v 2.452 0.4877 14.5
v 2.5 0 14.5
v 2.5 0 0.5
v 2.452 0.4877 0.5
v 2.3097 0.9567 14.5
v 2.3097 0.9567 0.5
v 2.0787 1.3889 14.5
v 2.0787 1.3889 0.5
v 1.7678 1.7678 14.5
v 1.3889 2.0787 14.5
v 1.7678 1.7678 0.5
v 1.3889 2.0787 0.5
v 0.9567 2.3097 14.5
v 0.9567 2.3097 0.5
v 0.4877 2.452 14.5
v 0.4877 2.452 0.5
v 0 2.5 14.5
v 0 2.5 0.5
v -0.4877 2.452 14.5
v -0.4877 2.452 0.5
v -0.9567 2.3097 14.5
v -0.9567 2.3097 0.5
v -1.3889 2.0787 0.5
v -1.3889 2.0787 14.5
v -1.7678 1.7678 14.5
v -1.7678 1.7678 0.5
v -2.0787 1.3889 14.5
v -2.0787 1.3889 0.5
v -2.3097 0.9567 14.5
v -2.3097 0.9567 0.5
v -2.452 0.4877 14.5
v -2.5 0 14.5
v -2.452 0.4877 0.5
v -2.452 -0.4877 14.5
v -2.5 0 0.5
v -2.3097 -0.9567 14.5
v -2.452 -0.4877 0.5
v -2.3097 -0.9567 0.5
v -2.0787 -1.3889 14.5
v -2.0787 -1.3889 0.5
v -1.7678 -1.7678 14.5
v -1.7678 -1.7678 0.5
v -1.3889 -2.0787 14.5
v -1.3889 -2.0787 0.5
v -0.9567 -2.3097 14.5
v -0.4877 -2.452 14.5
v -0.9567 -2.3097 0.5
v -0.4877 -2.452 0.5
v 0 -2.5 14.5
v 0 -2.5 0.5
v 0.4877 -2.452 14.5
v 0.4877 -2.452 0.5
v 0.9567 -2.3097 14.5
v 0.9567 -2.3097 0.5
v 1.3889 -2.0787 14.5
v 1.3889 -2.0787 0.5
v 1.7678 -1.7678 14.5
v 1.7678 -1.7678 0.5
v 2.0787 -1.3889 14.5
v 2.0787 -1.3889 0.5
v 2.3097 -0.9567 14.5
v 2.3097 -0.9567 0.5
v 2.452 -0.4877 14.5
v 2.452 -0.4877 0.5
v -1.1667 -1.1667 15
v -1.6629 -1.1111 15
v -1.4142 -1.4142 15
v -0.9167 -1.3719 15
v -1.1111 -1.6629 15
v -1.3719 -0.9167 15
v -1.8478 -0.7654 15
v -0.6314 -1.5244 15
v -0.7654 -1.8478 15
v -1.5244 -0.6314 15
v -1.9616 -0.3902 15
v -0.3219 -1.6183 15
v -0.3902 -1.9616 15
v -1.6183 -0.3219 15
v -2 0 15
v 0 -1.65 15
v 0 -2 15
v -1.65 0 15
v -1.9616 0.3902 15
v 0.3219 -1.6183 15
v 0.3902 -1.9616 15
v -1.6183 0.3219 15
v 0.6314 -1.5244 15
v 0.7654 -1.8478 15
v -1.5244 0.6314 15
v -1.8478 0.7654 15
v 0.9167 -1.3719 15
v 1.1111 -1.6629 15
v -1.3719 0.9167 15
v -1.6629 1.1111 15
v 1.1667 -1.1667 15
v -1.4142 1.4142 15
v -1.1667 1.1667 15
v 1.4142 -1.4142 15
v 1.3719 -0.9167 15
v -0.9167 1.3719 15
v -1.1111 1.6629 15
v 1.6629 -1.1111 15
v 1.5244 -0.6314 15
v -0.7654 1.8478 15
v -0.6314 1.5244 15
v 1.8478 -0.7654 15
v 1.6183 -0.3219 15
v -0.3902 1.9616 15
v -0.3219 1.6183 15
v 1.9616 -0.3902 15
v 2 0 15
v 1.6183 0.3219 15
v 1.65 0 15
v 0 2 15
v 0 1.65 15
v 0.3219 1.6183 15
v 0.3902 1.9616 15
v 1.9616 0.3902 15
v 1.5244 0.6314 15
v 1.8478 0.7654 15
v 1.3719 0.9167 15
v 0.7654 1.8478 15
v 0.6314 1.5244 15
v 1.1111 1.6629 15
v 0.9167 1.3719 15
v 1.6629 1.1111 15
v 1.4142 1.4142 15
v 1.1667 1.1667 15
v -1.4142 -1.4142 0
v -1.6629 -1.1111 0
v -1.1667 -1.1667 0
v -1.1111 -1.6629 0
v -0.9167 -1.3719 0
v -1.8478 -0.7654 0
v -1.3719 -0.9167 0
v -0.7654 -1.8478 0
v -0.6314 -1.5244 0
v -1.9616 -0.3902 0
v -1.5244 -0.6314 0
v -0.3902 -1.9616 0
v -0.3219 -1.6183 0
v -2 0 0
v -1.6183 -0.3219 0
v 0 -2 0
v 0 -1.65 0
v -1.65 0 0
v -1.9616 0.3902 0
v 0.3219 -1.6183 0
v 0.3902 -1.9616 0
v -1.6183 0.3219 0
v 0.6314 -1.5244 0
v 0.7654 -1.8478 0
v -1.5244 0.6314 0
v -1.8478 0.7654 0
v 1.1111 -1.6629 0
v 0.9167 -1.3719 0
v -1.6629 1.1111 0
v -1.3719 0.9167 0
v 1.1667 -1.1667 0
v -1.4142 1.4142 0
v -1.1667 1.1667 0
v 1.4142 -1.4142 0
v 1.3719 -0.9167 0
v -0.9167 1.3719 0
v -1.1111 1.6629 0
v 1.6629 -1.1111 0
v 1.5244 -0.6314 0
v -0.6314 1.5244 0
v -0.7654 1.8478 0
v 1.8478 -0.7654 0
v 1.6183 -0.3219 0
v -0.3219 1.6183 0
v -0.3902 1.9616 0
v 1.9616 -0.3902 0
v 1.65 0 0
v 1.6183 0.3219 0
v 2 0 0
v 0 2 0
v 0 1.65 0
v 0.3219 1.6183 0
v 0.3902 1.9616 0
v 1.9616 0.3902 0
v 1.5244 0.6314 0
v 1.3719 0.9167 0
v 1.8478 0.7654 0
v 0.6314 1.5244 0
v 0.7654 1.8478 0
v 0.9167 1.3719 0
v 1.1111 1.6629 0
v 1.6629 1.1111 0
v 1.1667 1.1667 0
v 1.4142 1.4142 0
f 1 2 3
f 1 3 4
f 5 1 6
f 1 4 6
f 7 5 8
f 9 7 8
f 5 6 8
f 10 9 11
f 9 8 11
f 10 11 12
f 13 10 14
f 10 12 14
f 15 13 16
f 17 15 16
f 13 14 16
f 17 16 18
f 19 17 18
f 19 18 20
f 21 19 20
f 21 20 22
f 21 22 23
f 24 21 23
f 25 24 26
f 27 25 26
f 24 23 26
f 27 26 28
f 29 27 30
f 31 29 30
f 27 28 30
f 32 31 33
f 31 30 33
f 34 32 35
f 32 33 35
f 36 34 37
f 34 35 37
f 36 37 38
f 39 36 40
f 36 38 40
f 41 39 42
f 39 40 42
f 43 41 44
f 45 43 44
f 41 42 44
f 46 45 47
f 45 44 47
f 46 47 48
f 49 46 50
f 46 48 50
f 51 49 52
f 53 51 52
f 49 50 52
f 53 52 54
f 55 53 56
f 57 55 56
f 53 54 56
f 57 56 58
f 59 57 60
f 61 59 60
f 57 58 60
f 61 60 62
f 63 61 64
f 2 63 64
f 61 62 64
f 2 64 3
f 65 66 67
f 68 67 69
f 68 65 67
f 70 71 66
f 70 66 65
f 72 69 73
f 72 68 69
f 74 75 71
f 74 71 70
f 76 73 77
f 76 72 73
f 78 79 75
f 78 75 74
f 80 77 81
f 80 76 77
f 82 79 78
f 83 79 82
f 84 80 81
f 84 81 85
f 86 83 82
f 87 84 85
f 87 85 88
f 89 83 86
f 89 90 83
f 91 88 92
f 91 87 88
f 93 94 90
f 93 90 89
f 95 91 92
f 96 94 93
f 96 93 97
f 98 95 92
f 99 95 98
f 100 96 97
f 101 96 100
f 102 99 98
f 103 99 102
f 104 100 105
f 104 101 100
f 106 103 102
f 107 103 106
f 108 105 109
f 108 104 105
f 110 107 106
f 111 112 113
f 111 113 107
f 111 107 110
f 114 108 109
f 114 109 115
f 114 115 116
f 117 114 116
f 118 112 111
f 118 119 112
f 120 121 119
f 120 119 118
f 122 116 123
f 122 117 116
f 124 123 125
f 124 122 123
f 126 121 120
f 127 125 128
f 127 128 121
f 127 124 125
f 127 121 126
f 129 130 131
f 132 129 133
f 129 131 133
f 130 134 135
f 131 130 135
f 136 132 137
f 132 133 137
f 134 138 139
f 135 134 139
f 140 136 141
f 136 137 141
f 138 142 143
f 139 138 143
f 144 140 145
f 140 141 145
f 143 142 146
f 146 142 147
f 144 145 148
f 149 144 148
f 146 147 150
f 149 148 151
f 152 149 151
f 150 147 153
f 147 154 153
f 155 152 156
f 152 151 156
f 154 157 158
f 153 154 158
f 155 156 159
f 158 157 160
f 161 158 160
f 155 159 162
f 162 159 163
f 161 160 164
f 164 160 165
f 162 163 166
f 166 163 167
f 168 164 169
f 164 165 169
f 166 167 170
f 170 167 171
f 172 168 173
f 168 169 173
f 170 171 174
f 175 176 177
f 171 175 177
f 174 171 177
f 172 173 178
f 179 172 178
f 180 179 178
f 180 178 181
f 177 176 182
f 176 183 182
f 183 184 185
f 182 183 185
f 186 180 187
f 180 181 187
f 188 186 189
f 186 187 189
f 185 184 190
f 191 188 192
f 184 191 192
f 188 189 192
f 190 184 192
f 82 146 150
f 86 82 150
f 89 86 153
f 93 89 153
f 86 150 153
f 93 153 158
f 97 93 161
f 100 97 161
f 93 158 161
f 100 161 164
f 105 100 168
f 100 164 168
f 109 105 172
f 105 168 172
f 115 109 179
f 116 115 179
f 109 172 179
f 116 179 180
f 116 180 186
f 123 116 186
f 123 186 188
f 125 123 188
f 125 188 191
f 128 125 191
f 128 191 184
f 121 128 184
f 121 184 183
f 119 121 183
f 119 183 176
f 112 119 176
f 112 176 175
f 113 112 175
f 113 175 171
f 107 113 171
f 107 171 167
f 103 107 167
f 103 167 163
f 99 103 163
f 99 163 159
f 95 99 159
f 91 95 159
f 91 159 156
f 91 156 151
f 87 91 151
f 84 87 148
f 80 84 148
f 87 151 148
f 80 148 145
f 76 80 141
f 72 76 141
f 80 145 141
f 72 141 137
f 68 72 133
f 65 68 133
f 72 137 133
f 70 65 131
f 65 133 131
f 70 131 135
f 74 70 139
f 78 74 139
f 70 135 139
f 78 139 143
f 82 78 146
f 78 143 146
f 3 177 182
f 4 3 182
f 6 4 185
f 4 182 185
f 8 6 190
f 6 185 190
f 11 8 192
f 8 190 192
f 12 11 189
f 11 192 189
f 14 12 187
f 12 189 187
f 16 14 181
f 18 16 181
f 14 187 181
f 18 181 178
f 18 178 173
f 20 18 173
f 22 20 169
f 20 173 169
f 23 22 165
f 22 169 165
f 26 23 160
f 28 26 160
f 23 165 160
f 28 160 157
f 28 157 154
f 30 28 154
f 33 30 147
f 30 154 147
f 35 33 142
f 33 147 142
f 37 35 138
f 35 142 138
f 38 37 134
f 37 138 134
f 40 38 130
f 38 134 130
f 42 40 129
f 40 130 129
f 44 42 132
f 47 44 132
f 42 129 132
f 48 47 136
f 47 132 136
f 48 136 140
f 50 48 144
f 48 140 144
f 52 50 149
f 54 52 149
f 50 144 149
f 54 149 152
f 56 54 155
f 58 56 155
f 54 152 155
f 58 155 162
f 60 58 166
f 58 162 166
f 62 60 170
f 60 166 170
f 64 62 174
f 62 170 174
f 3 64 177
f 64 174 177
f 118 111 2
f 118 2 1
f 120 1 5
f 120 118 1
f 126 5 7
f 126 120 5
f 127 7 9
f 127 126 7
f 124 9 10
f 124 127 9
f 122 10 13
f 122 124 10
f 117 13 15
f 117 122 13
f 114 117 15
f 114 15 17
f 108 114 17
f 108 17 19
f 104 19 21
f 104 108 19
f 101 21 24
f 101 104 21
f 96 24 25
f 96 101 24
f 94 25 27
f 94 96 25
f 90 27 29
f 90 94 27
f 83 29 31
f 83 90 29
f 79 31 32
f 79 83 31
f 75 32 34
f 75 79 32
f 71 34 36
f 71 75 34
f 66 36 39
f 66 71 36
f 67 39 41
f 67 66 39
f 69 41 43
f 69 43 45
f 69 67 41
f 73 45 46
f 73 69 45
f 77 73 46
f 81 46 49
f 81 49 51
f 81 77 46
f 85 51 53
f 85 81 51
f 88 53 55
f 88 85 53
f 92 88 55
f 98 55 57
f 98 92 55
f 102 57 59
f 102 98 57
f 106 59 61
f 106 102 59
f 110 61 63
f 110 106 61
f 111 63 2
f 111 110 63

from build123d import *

# Parameters (mm, degrees)
ESQUISSE1_R       = 2.5
EXTRUSION1_DEPTH  = 15
CHANFREIN1_SIZE   = 0.5
TROU_TARAUD_M41_D = 3.3


with BuildPart() as part:
    # Esquisse1 → Extrusion1 (new body)
    with BuildSketch(Plane.XY):
        Circle(ESQUISSE1_R)
    extrude(amount=EXTRUSION1_DEPTH)

    # Chanfrein1
    chanfrein1_edges = [part.edges().sort_by_distance(p)[0] for p in [
        (-2.5, 0, 0),
        (-2.5, 0, 15),
    ]]
    chamfer(chanfrein1_edges, length=CHANFREIN1_SIZE)

    # Trou taraudé M41 (through all)
    with Locations(Plane.XY.offset(15)):
        with Locations((0, 0)):
            Hole(TROU_TARAUD_M41_D / 2)


solid = part.part
